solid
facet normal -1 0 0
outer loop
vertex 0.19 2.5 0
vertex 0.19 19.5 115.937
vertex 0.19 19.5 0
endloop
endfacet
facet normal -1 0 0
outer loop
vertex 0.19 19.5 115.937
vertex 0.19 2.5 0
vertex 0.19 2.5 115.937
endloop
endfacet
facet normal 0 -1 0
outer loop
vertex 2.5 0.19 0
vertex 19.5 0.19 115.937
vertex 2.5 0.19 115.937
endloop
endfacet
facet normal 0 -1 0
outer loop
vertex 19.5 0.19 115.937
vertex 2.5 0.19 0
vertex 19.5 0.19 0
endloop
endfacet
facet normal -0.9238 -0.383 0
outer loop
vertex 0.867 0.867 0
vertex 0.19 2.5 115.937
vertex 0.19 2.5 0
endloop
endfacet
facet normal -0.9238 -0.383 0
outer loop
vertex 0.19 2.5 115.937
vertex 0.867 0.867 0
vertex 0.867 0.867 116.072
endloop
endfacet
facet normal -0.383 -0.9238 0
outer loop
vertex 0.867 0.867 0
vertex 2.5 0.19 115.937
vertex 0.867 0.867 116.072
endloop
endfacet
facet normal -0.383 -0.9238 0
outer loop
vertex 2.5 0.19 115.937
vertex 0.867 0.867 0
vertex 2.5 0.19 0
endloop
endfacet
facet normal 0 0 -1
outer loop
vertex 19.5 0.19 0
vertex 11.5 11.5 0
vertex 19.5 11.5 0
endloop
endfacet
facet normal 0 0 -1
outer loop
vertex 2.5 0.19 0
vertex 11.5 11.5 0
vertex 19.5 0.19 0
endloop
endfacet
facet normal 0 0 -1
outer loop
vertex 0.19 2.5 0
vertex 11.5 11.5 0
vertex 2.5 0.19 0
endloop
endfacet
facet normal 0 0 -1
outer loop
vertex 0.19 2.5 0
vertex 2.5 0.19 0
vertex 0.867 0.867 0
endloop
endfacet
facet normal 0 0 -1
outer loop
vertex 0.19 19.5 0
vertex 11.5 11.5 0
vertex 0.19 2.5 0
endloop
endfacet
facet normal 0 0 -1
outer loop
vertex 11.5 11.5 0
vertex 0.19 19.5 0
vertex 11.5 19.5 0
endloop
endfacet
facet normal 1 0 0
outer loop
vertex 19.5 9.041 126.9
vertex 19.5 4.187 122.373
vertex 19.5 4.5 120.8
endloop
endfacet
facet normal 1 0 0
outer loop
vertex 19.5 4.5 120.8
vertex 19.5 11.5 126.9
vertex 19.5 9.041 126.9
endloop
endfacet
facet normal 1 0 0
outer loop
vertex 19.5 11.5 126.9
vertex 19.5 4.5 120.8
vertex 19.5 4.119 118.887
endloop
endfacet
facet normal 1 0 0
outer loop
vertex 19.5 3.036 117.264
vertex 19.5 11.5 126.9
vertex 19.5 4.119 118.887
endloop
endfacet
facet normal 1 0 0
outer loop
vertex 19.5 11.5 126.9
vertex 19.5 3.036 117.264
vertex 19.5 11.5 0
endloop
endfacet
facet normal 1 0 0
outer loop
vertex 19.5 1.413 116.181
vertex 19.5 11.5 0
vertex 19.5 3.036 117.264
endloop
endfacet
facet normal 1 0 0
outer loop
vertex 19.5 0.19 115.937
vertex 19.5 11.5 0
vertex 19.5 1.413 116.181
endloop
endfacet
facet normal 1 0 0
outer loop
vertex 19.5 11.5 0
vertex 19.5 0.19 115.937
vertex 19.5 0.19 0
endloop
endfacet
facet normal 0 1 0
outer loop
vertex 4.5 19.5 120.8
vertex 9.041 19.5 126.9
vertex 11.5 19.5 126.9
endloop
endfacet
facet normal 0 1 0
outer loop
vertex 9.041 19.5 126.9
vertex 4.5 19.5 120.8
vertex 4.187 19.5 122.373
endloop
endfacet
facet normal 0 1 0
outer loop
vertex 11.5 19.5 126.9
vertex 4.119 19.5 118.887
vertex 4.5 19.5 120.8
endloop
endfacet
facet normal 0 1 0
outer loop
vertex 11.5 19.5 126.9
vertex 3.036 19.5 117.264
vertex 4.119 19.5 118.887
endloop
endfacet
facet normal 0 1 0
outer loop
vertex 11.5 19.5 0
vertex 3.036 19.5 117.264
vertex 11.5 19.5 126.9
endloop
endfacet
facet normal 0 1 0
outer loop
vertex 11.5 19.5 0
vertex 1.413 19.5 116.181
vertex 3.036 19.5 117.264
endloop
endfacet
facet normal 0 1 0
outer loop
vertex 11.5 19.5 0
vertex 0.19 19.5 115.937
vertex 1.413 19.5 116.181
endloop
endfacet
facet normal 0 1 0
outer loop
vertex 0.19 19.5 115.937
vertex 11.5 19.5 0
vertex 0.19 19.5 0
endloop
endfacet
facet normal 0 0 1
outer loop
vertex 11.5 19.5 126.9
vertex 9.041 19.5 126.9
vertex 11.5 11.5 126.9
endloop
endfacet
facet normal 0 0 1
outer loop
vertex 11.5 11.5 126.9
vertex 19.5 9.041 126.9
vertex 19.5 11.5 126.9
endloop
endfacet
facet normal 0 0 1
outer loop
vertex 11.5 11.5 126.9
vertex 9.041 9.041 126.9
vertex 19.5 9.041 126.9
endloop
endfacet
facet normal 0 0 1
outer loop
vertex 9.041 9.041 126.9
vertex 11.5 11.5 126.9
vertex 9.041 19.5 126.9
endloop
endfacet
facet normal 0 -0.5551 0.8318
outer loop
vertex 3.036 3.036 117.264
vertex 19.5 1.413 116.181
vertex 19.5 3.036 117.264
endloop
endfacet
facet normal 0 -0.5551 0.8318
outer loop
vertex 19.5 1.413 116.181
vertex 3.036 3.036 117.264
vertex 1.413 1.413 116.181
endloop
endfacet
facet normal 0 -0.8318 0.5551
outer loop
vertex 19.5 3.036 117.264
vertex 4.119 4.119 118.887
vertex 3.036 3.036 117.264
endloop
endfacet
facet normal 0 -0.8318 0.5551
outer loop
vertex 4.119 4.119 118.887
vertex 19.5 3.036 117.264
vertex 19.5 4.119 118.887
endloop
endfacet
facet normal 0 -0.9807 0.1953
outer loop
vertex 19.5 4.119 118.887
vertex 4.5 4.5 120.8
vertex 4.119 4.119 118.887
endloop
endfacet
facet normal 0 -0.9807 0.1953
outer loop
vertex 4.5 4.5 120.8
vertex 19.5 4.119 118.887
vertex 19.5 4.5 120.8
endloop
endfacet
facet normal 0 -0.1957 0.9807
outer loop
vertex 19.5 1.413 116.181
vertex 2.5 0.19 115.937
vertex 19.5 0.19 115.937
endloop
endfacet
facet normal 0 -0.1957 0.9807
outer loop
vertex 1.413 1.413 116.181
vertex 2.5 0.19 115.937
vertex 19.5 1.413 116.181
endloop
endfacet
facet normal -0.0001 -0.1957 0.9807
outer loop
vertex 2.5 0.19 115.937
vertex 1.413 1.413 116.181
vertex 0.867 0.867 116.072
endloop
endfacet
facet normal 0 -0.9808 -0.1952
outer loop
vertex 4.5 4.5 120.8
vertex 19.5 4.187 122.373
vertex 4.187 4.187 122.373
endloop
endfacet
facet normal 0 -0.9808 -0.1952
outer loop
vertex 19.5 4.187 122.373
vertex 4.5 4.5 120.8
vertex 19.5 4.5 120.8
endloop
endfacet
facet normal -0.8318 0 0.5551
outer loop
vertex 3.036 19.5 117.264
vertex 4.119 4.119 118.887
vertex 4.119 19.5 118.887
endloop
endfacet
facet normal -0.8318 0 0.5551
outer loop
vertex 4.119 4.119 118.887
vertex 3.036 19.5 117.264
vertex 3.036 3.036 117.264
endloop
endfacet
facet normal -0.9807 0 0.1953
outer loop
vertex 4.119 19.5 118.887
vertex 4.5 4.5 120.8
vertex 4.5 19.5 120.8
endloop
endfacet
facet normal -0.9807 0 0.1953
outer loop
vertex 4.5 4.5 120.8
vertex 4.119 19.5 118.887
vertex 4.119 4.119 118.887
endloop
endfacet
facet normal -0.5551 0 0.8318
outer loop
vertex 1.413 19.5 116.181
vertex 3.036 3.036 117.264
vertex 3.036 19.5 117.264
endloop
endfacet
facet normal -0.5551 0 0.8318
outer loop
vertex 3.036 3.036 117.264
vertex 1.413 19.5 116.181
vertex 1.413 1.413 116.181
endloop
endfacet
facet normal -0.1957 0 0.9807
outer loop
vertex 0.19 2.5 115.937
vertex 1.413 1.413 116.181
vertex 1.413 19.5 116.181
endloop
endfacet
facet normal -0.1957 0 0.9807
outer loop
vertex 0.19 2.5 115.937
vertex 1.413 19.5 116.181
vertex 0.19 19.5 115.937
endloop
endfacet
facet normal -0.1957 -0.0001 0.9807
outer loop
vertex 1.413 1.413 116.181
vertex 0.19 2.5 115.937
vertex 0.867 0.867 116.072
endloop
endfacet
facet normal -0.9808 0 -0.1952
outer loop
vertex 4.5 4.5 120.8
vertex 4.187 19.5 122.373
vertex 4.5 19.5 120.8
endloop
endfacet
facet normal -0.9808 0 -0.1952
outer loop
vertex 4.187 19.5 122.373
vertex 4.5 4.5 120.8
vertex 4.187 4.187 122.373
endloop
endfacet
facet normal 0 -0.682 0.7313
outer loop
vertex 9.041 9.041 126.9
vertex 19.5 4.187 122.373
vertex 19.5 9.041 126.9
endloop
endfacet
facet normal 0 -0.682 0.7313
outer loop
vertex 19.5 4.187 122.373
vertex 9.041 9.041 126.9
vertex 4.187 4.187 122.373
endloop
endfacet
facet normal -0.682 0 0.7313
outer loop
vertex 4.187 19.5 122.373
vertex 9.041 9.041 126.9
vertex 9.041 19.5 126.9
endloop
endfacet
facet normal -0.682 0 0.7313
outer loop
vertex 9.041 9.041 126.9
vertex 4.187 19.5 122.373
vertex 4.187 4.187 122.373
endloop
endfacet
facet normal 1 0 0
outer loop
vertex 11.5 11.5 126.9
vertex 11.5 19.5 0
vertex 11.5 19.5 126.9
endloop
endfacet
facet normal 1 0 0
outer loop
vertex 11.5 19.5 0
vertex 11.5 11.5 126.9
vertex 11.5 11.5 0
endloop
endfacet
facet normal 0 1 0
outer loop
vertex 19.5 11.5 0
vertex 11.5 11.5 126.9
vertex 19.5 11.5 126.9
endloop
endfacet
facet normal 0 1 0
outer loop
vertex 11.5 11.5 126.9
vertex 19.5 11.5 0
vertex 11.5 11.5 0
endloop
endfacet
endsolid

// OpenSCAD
//h=127.3;//4.25 3(5/8)in
hi=107.9;//(4.25*25.4);//the height of your trim 

h=hi+19;//(.75*25.4);//add three quarters inch to that
w=19.5;//width of the corner
corner=8;//how much of the corner should this hug (for wrap-around corners)

t=8.6;//where the top should be??
r=5;//radius of rounded section
ca=3;//offset of the rounded section
angle=43;//angle of the slant at the top
erd=5;//edge rounded diameter
herd=erd/2;//edge radius
invisit=1;//unnecessary, used to make OpenSCAD previews cleaner


difference(){
minkowski(){//build the rounded rectangle
translate([herd,herd,0])cube([w,w,h]);
sphere(d=erd);//round that edge
}
translate([w,0,0])cube([w+erd,w+erd,h+erd]);//cut right edge
translate([0,w,0])cube([w+erd,w+erd,h+erd]);//cut back edge
translate([0,0,-w])cube([w+erd,w+erd,w]);//cut bottom edge
translate([0,0,h])cube([w+erd,w+erd,w]);//trim top edge
translate([0,herd,herd])translate([0,-ca,h-t])
	rotate([0,90,0])cylinder(h=w+invisit,r=r);//front rounded
translate([herd,0,herd])translate([-ca,0,h-t])
	rotate([-90,0,0])cylinder(h=w+invisit+erd,r=r);//left rounded
translate([herd,herd,herd])translate([0,0,h-t])
	rotate([angle,0,0])cube([w+invisit,h,w]);//front slant
translate([herd,herd,herd])translate([0,0,h-t])
	rotate([0,-angle,0])cube([h,w+invisit,w]);//left slant
translate([0,0,h-t])cube([3,3,20]);//takes out a little bit extra
translate([w-corner,w-corner,0])cube([corner+invisit,corner+invisit,h+invisit]);//remove the corner (use on mountain folds, not room corners)


}
